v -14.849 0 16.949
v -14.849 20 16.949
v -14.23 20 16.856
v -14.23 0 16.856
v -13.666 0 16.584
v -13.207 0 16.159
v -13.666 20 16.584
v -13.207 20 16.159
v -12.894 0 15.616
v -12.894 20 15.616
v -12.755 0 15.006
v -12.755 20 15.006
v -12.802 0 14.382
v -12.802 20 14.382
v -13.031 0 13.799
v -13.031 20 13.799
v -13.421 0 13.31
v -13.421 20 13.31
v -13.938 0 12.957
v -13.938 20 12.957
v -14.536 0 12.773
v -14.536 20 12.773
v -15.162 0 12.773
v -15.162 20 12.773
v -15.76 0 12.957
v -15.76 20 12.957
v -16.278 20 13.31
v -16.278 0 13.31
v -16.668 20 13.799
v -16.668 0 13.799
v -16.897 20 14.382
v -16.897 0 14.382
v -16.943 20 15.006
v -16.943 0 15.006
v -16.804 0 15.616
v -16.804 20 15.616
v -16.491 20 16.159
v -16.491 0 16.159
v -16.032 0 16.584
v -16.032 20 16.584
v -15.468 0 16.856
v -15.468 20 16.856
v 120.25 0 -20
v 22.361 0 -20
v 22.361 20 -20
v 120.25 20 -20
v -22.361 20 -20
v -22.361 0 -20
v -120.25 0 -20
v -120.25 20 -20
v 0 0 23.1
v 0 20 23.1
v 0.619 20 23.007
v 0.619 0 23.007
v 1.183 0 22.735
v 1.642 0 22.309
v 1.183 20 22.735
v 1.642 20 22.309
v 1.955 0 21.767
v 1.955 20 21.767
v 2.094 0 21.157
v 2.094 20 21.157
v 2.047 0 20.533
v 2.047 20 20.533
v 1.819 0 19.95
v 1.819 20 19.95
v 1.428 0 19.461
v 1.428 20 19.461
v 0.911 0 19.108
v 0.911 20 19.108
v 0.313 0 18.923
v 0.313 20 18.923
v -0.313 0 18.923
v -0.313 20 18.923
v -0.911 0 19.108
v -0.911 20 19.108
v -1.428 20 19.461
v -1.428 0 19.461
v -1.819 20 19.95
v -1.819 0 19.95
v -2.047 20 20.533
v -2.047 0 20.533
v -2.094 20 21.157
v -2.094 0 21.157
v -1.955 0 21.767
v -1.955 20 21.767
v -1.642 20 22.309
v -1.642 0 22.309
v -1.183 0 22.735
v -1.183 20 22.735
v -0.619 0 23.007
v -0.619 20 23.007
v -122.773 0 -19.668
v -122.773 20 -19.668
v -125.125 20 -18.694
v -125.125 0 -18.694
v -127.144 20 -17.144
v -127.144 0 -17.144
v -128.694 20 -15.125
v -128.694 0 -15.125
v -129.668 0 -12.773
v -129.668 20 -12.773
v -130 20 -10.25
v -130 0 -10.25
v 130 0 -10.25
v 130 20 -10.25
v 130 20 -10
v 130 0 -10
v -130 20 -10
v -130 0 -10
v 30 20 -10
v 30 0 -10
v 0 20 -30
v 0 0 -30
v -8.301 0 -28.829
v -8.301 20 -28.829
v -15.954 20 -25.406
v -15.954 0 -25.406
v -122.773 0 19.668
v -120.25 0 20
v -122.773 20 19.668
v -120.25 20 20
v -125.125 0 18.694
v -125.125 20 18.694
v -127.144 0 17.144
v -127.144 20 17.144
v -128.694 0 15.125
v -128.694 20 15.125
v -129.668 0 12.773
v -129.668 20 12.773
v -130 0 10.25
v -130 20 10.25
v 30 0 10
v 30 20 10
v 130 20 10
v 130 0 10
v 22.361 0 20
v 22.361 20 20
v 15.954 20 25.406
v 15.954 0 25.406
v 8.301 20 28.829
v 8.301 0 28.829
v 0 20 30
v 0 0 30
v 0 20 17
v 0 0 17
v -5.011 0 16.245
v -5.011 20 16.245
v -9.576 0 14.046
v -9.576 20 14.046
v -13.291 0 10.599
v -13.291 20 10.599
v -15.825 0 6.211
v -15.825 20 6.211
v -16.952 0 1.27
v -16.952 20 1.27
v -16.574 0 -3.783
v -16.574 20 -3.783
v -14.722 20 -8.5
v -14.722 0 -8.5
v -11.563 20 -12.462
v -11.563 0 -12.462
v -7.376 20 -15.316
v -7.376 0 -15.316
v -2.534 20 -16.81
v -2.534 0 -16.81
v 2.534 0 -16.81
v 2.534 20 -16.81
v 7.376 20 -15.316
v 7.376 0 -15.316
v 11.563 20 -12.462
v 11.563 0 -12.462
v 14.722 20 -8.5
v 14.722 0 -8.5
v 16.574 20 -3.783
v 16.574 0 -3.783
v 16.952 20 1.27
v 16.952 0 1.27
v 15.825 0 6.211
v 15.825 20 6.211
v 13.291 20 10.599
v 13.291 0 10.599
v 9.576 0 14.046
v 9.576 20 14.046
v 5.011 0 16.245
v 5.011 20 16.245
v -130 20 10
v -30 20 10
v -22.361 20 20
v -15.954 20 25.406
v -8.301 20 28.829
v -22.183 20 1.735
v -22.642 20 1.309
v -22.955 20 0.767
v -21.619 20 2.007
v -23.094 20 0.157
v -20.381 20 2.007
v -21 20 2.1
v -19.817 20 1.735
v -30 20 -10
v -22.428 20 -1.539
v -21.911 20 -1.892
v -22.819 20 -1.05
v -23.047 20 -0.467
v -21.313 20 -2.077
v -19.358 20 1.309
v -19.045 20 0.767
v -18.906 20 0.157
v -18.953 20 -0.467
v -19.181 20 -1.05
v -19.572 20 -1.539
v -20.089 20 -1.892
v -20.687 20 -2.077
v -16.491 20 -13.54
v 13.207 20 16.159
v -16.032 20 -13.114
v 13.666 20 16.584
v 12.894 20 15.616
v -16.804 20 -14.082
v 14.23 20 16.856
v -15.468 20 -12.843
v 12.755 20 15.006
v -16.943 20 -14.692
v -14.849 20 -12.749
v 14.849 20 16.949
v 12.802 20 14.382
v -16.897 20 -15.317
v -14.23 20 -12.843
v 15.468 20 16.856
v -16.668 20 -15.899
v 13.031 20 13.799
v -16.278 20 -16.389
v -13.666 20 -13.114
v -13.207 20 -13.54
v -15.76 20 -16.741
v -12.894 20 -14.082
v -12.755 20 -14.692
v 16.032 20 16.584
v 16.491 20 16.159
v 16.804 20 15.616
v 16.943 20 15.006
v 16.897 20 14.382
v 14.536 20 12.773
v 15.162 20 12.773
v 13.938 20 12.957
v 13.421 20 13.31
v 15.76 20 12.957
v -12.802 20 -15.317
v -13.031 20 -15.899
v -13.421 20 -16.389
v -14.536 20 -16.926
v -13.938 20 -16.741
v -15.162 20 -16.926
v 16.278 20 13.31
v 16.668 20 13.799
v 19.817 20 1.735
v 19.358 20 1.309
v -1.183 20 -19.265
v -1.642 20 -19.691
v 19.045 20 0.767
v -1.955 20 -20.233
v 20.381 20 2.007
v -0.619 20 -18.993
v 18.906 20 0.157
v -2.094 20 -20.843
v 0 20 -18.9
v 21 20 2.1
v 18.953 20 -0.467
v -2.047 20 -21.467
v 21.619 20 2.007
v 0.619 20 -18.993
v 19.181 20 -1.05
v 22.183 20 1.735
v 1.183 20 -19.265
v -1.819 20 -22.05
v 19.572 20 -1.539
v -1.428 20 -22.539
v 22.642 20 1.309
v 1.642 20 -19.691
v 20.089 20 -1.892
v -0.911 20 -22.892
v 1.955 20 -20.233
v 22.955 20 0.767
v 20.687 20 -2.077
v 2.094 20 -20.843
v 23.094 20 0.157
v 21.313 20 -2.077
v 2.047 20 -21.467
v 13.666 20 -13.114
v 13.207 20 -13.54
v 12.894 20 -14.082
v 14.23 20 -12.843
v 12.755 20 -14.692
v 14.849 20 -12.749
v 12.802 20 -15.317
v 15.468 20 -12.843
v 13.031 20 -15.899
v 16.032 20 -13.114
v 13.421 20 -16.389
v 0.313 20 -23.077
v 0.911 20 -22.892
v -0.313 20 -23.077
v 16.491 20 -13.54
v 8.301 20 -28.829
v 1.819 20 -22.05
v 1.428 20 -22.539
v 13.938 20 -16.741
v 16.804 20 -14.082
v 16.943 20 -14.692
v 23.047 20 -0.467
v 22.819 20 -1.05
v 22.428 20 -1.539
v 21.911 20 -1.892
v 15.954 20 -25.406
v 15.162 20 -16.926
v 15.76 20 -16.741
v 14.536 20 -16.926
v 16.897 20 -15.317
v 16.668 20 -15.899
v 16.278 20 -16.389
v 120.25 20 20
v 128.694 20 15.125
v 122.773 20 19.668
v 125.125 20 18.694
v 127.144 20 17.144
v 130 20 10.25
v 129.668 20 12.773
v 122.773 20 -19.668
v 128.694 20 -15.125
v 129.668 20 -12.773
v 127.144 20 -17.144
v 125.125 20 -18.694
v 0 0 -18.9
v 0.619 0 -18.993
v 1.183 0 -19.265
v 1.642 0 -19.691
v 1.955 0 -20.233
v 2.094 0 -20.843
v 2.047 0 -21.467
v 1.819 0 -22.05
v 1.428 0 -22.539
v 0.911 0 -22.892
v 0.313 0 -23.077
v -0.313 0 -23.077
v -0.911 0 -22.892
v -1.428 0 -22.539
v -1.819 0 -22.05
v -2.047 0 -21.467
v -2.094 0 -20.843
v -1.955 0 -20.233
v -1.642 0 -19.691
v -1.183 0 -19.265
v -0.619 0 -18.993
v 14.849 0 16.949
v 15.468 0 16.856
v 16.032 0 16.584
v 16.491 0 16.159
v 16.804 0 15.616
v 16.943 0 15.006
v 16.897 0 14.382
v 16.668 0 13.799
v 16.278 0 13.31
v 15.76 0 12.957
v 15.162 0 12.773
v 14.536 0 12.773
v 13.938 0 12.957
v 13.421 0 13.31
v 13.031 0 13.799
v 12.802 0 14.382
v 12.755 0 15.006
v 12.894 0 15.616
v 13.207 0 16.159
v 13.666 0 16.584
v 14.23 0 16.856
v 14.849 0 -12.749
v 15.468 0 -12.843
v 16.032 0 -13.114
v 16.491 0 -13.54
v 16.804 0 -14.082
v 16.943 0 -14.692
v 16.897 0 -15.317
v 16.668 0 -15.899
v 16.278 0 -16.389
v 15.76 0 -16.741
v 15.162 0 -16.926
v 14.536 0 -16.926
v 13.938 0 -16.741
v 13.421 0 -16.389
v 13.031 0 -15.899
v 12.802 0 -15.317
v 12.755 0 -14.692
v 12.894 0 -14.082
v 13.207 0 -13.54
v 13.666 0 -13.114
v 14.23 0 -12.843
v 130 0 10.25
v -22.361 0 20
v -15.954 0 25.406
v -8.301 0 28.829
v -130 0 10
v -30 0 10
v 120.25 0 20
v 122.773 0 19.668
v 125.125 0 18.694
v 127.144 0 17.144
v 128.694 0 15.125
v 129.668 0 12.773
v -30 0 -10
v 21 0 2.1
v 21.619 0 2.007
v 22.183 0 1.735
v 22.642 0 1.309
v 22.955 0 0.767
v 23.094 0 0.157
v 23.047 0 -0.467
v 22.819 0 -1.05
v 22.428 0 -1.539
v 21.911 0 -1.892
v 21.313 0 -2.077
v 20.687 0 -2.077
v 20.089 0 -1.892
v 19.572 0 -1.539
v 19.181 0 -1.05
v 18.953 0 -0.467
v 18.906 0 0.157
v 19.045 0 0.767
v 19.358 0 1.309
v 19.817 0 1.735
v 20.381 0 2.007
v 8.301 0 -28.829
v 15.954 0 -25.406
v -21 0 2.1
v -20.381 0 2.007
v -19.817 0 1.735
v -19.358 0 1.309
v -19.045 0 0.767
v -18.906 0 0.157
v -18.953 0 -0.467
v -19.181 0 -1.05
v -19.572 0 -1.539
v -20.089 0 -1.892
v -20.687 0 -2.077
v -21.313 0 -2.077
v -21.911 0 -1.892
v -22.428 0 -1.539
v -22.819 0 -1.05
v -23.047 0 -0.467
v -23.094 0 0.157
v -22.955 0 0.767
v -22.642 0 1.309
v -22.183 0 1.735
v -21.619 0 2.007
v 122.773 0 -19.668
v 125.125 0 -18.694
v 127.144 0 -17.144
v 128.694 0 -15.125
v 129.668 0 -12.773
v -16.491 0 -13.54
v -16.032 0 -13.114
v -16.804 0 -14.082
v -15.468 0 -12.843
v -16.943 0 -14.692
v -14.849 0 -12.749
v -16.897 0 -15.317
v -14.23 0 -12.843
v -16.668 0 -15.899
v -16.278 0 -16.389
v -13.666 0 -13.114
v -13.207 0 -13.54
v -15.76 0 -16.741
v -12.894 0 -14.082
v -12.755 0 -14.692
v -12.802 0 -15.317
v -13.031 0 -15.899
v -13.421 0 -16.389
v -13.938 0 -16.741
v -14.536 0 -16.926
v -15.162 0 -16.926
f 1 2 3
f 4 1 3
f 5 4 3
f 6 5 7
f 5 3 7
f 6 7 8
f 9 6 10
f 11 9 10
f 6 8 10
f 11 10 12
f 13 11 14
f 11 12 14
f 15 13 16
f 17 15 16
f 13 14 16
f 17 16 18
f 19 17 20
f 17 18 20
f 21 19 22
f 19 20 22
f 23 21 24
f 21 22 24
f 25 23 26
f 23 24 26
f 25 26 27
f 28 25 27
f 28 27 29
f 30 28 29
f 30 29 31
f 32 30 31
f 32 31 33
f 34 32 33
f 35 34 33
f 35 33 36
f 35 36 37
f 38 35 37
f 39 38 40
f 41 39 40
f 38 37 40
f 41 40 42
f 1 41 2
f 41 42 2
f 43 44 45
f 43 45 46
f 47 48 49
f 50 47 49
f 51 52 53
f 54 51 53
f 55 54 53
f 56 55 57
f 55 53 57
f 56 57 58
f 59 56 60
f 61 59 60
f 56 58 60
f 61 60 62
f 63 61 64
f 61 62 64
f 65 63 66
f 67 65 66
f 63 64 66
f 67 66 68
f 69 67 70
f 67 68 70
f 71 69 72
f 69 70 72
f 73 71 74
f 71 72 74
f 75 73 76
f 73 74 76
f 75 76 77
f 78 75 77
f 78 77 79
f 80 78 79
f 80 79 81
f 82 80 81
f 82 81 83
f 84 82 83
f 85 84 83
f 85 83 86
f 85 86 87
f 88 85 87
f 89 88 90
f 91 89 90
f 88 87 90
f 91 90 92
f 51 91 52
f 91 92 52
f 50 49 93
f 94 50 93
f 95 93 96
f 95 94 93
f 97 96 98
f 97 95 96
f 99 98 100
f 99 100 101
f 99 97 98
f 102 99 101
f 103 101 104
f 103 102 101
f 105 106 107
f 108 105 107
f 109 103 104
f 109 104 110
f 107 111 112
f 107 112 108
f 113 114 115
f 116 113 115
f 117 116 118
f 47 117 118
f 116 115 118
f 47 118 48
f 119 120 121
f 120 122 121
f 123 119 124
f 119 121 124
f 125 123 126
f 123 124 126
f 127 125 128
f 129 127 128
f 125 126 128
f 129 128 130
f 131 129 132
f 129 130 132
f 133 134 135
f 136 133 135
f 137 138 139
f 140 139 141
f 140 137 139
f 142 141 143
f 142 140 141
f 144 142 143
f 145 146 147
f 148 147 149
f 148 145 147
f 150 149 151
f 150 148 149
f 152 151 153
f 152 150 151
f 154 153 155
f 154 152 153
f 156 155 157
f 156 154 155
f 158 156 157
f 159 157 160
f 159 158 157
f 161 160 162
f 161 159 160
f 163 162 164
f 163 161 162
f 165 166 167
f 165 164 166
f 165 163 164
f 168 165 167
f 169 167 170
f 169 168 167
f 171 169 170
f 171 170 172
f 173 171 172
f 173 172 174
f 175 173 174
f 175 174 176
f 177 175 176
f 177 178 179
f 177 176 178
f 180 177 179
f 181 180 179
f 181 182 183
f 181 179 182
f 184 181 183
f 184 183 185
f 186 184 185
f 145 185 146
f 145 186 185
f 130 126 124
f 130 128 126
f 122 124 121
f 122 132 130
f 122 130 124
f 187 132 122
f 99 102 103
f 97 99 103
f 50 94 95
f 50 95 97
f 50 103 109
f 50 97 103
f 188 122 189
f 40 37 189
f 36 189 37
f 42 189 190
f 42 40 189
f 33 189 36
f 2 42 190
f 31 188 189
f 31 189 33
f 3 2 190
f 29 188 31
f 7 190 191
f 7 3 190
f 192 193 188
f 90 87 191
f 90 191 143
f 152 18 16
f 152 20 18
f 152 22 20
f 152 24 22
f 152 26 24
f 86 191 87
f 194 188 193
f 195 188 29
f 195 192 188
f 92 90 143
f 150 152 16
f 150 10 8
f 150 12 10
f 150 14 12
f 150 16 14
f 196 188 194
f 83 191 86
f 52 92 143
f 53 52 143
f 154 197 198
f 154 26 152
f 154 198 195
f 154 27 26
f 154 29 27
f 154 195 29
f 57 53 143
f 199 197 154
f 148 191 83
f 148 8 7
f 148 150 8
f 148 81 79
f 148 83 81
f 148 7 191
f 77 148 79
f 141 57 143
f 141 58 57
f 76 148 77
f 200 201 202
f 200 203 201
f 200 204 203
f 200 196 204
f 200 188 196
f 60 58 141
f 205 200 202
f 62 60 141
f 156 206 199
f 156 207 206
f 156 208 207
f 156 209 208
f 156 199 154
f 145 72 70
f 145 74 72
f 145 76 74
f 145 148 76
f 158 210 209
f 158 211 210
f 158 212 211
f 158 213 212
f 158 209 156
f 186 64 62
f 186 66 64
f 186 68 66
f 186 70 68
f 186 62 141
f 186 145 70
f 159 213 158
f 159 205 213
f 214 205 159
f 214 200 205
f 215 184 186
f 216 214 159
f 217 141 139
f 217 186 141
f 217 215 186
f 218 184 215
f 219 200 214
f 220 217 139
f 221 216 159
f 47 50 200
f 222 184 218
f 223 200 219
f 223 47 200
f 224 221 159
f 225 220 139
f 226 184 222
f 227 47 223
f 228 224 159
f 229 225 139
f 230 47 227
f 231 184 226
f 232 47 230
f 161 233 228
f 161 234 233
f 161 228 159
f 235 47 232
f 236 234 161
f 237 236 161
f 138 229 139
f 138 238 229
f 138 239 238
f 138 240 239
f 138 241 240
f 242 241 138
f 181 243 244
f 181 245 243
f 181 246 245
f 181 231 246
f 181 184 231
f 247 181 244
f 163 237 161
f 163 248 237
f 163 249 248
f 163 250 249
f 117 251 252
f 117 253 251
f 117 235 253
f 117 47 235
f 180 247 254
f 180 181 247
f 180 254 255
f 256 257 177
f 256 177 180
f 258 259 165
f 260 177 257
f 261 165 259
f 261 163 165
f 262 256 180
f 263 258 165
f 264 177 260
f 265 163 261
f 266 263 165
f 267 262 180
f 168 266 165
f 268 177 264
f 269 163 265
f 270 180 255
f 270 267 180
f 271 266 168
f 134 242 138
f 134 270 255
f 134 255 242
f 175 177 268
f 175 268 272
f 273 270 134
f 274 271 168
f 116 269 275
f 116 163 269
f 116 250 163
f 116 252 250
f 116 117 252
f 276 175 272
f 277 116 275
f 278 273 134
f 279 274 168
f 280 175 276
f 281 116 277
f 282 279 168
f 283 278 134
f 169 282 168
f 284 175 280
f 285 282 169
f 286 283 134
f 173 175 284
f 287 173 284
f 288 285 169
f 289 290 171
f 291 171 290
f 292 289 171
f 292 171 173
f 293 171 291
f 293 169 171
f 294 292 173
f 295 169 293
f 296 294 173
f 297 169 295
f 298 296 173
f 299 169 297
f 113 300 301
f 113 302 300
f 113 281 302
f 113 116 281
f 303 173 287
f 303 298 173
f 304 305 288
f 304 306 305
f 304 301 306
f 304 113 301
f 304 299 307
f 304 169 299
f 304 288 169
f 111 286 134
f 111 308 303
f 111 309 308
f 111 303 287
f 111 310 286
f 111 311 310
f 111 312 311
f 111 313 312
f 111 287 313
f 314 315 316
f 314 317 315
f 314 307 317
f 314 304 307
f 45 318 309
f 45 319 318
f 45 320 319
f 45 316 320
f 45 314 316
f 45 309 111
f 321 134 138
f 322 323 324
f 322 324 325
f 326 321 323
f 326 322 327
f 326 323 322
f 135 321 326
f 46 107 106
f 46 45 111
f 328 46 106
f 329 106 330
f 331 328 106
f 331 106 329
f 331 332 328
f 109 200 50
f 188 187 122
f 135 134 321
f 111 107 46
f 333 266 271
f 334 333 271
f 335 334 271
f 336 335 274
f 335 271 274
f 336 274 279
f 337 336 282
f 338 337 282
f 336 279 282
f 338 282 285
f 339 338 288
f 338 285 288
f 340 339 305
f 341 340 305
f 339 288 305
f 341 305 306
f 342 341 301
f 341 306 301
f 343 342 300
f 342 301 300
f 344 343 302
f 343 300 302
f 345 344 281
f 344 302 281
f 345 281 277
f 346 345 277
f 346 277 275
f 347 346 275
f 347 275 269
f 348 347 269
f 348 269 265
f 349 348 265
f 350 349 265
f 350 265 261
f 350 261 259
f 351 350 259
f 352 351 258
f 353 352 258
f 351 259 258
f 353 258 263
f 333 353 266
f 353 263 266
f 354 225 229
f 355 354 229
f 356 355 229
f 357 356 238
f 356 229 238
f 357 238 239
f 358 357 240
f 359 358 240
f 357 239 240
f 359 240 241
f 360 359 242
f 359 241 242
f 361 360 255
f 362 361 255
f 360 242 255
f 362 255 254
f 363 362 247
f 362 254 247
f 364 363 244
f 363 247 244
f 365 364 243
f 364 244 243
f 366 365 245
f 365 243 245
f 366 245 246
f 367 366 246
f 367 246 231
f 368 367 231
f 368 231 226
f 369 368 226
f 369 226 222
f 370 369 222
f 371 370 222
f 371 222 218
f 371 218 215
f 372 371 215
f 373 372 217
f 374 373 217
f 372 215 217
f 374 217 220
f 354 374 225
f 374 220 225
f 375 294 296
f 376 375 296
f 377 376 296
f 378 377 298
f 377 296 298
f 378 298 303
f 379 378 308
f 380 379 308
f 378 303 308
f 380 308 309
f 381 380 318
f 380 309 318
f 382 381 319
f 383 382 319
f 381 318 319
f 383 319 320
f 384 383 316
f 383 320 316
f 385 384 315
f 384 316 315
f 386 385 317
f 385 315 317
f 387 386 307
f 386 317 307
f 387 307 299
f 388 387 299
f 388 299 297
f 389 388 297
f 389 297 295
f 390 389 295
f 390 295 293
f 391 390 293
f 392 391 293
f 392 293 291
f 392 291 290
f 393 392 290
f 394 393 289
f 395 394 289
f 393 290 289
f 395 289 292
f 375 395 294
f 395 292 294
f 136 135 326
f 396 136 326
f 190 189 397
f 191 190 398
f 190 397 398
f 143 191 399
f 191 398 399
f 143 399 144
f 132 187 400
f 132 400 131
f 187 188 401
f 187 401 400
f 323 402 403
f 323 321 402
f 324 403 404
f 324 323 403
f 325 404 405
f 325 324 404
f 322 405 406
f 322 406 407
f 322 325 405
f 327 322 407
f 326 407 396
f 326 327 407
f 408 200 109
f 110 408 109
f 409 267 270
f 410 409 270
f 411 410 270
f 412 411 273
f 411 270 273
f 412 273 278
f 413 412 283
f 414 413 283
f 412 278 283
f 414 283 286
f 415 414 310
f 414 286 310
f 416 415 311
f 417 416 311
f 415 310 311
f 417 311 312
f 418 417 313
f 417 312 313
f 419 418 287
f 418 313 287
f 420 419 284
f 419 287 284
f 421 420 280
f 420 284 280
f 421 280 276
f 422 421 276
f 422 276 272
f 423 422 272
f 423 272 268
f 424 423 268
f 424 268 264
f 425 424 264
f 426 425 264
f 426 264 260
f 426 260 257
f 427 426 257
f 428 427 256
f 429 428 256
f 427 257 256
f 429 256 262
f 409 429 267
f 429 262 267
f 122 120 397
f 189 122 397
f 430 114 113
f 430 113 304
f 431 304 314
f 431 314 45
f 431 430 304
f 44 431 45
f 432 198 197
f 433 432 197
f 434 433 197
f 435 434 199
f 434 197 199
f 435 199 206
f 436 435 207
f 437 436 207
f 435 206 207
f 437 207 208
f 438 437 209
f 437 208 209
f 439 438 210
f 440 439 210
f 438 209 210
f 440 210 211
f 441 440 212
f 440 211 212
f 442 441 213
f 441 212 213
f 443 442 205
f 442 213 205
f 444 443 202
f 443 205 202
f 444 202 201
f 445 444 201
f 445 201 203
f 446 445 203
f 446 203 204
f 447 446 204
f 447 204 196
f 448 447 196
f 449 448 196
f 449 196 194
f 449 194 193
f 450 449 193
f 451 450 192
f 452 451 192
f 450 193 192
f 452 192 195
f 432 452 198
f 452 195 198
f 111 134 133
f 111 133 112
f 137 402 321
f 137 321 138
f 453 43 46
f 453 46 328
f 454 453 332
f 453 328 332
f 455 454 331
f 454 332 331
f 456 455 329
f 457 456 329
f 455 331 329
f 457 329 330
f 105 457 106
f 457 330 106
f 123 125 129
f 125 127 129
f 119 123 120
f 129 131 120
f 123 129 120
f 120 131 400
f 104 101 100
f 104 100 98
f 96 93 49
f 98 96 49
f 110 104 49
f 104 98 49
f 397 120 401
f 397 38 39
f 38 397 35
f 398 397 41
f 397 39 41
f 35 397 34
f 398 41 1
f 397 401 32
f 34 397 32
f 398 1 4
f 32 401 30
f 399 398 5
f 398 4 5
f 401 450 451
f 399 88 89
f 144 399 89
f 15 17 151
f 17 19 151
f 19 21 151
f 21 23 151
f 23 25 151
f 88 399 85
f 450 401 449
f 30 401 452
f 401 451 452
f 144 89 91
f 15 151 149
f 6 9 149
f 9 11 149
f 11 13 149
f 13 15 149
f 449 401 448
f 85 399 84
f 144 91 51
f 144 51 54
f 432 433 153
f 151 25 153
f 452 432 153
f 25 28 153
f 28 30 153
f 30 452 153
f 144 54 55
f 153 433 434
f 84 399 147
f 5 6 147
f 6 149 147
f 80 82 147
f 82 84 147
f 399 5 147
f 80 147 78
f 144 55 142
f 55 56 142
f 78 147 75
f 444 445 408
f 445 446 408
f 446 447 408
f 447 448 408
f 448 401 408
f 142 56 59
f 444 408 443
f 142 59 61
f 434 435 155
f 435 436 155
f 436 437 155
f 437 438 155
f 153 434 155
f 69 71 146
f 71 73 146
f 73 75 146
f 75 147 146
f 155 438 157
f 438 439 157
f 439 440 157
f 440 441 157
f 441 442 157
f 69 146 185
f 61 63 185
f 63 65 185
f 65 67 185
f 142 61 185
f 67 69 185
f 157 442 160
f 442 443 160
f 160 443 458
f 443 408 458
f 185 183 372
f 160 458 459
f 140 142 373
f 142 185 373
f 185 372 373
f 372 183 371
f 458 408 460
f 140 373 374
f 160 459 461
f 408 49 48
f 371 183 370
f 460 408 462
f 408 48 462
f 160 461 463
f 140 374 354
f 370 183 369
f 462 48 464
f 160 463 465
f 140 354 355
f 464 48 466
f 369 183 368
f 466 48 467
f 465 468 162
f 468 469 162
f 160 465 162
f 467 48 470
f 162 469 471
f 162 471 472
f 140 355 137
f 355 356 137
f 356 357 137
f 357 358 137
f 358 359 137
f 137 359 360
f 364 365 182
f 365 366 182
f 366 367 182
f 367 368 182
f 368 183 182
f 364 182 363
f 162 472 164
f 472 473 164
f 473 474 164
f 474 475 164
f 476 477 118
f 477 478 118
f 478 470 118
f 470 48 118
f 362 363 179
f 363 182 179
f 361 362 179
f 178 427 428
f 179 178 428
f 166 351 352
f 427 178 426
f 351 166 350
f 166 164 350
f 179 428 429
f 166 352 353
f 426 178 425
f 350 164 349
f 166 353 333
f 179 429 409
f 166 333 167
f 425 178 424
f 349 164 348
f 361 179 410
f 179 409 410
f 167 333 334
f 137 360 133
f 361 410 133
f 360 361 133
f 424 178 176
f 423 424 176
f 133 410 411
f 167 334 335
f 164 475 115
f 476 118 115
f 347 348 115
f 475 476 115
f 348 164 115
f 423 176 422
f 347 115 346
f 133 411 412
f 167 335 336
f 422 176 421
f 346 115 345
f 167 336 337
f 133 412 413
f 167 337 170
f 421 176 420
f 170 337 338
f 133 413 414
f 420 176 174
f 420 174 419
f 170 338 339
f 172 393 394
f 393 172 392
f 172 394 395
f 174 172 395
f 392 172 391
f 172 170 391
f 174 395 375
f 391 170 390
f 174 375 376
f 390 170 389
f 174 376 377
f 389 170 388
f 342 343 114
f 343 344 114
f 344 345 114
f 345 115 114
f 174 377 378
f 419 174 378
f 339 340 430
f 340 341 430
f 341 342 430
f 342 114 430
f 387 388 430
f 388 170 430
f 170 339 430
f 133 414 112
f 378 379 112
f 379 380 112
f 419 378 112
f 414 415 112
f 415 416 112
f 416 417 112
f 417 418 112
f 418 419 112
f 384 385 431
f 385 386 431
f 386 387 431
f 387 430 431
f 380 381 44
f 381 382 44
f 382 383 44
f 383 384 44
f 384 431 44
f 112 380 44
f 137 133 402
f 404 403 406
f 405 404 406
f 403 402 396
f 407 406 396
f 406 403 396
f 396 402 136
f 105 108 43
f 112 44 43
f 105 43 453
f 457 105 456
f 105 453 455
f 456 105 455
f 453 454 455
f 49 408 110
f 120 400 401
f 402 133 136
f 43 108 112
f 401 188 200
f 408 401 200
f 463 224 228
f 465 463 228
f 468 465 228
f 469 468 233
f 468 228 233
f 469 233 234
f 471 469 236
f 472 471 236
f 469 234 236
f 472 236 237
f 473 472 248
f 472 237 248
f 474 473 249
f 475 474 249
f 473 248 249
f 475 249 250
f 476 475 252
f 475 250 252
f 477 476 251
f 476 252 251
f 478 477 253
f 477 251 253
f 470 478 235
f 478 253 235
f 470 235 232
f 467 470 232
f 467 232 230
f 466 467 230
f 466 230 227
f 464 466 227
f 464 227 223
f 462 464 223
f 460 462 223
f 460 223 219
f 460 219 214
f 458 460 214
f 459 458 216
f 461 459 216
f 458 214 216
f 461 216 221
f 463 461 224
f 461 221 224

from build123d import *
from build123d.topology import SkipClean

# Parameters (mm, degrees)
BOSS_EXTRUDE1_DEPTH  = 20
SKETCH2_W            = 100
SKETCH2_H            = 20
CUT_EXTRUDE1_DEPTH   = 20
FILLET1_R            = 9.75
FILLET1_OF_MIRROR4_R = 9.75
SKETCH4_R            = 2.1
CUT_EXTRUDE3_DEPTH   = 20


with BuildPart() as part:
    # Sketch1 → Boss-Extrude1 (new body)
    with BuildSketch(Plane(origin=(0, 0, 0), x_dir=(1, 0, 0), z_dir=(0, 1, 0))):
        with BuildLine():
            Line((22.360679775, 20), (130, 20))
            Line((130, 20), (130, -20))
            Line((130, -20), (22.360679775, -20))
            ThreePointArc((22.360679775, -20), (12.247448714, -27.386127875), (0, -30))
            Line((0, -30), (0, -20))
            Line((0, -20), (0, 20))
            Line((0, 20), (0, 30))
            ThreePointArc((0, 30), (12.247448714, 27.386127875), (22.360679775, 20))
        make_face()
    boss_extrude1 = extrude(amount=BOSS_EXTRUDE1_DEPTH)

    # Sketch2 → Cut-Extrude1 (cut)
    with BuildSketch(Plane(origin=(0, 20, 0), x_dir=(1, 0, 0), z_dir=(0, 1, 0))):
        with BuildLine():
            Line((0, 17), (0, -17))
            ThreePointArc((0, -17), (17, 0), (0, 17))
        make_face()
        with Locations((80, 0)):
            Rectangle(SKETCH2_W, SKETCH2_H)
    cut_extrude1 = extrude(amount=-CUT_EXTRUDE1_DEPTH, mode=Mode.SUBTRACT)

    # Fillet1
    fillet1_edges = [part.edges().sort_by_distance(p)[0] for p in [
        (130, 10, -20),
        (130, 10, 20),
    ]]
    fillet(fillet1_edges, radius=FILLET1_R)

    # Mirror4: Boss-Extrude1, Cut-Extrude1 across plane
    with SkipClean():  # the faces are left unmerged after this step: merging them gives an invalid solid
        add(boss_extrude1.mirror(Plane(origin=(0, 0, 0), x_dir=(0, 0, 1), z_dir=(1, 0, 0))))
        add(cut_extrude1.mirror(Plane(origin=(0, 0, 0), x_dir=(0, 0, 1), z_dir=(1, 0, 0))), mode=Mode.SUBTRACT)
    add(part.part.scale(1), mode=Mode.REPLACE)  # the faces are merged on a copy

    # Fillet1 of Mirror4
    fillet1_of_mirror4_edges = [part.edges().sort_by_distance(p)[0] for p in [
        (-130, 10, -20),
        (-130, 10, 20),
    ]]
    fillet(fillet1_of_mirror4_edges, radius=FILLET1_OF_MIRROR4_R)

    # Sketch4 → Cut-Extrude3 (cut)
    with BuildSketch(Plane(origin=(0, 20, 0), x_dir=(1, 0, 0), z_dir=(0, 1, 0))):
        with Locations(Location((21, 0, 0), (0, 0, 270))):
            Circle(SKETCH4_R)
        with Locations(Location((14.849242405, -14.849242405, 0), (0, 0, 270))):
            Circle(SKETCH4_R)
        with Locations(Location((0, -21, 0), (0, 0, 270))):
            Circle(SKETCH4_R)
        with Locations(Location((-14.849242405, -14.849242405, 0), (0, 0, 270))):
            Circle(SKETCH4_R)
        with Locations(Location((-21, 0, 0), (0, 0, 270))):
            Circle(SKETCH4_R)
        with Locations(Location((-14.849242405, 14.849242405, 0), (0, 0, 270))):
            Circle(SKETCH4_R)
        with Locations(Location((0, 21, 0), (0, 0, 270))):
            Circle(SKETCH4_R)
        with Locations(Location((14.849242405, 14.849242405, 0), (0, 0, 270))):
            Circle(SKETCH4_R)
    extrude(amount=-CUT_EXTRUDE3_DEPTH, mode=Mode.SUBTRACT)


solid = part.part
